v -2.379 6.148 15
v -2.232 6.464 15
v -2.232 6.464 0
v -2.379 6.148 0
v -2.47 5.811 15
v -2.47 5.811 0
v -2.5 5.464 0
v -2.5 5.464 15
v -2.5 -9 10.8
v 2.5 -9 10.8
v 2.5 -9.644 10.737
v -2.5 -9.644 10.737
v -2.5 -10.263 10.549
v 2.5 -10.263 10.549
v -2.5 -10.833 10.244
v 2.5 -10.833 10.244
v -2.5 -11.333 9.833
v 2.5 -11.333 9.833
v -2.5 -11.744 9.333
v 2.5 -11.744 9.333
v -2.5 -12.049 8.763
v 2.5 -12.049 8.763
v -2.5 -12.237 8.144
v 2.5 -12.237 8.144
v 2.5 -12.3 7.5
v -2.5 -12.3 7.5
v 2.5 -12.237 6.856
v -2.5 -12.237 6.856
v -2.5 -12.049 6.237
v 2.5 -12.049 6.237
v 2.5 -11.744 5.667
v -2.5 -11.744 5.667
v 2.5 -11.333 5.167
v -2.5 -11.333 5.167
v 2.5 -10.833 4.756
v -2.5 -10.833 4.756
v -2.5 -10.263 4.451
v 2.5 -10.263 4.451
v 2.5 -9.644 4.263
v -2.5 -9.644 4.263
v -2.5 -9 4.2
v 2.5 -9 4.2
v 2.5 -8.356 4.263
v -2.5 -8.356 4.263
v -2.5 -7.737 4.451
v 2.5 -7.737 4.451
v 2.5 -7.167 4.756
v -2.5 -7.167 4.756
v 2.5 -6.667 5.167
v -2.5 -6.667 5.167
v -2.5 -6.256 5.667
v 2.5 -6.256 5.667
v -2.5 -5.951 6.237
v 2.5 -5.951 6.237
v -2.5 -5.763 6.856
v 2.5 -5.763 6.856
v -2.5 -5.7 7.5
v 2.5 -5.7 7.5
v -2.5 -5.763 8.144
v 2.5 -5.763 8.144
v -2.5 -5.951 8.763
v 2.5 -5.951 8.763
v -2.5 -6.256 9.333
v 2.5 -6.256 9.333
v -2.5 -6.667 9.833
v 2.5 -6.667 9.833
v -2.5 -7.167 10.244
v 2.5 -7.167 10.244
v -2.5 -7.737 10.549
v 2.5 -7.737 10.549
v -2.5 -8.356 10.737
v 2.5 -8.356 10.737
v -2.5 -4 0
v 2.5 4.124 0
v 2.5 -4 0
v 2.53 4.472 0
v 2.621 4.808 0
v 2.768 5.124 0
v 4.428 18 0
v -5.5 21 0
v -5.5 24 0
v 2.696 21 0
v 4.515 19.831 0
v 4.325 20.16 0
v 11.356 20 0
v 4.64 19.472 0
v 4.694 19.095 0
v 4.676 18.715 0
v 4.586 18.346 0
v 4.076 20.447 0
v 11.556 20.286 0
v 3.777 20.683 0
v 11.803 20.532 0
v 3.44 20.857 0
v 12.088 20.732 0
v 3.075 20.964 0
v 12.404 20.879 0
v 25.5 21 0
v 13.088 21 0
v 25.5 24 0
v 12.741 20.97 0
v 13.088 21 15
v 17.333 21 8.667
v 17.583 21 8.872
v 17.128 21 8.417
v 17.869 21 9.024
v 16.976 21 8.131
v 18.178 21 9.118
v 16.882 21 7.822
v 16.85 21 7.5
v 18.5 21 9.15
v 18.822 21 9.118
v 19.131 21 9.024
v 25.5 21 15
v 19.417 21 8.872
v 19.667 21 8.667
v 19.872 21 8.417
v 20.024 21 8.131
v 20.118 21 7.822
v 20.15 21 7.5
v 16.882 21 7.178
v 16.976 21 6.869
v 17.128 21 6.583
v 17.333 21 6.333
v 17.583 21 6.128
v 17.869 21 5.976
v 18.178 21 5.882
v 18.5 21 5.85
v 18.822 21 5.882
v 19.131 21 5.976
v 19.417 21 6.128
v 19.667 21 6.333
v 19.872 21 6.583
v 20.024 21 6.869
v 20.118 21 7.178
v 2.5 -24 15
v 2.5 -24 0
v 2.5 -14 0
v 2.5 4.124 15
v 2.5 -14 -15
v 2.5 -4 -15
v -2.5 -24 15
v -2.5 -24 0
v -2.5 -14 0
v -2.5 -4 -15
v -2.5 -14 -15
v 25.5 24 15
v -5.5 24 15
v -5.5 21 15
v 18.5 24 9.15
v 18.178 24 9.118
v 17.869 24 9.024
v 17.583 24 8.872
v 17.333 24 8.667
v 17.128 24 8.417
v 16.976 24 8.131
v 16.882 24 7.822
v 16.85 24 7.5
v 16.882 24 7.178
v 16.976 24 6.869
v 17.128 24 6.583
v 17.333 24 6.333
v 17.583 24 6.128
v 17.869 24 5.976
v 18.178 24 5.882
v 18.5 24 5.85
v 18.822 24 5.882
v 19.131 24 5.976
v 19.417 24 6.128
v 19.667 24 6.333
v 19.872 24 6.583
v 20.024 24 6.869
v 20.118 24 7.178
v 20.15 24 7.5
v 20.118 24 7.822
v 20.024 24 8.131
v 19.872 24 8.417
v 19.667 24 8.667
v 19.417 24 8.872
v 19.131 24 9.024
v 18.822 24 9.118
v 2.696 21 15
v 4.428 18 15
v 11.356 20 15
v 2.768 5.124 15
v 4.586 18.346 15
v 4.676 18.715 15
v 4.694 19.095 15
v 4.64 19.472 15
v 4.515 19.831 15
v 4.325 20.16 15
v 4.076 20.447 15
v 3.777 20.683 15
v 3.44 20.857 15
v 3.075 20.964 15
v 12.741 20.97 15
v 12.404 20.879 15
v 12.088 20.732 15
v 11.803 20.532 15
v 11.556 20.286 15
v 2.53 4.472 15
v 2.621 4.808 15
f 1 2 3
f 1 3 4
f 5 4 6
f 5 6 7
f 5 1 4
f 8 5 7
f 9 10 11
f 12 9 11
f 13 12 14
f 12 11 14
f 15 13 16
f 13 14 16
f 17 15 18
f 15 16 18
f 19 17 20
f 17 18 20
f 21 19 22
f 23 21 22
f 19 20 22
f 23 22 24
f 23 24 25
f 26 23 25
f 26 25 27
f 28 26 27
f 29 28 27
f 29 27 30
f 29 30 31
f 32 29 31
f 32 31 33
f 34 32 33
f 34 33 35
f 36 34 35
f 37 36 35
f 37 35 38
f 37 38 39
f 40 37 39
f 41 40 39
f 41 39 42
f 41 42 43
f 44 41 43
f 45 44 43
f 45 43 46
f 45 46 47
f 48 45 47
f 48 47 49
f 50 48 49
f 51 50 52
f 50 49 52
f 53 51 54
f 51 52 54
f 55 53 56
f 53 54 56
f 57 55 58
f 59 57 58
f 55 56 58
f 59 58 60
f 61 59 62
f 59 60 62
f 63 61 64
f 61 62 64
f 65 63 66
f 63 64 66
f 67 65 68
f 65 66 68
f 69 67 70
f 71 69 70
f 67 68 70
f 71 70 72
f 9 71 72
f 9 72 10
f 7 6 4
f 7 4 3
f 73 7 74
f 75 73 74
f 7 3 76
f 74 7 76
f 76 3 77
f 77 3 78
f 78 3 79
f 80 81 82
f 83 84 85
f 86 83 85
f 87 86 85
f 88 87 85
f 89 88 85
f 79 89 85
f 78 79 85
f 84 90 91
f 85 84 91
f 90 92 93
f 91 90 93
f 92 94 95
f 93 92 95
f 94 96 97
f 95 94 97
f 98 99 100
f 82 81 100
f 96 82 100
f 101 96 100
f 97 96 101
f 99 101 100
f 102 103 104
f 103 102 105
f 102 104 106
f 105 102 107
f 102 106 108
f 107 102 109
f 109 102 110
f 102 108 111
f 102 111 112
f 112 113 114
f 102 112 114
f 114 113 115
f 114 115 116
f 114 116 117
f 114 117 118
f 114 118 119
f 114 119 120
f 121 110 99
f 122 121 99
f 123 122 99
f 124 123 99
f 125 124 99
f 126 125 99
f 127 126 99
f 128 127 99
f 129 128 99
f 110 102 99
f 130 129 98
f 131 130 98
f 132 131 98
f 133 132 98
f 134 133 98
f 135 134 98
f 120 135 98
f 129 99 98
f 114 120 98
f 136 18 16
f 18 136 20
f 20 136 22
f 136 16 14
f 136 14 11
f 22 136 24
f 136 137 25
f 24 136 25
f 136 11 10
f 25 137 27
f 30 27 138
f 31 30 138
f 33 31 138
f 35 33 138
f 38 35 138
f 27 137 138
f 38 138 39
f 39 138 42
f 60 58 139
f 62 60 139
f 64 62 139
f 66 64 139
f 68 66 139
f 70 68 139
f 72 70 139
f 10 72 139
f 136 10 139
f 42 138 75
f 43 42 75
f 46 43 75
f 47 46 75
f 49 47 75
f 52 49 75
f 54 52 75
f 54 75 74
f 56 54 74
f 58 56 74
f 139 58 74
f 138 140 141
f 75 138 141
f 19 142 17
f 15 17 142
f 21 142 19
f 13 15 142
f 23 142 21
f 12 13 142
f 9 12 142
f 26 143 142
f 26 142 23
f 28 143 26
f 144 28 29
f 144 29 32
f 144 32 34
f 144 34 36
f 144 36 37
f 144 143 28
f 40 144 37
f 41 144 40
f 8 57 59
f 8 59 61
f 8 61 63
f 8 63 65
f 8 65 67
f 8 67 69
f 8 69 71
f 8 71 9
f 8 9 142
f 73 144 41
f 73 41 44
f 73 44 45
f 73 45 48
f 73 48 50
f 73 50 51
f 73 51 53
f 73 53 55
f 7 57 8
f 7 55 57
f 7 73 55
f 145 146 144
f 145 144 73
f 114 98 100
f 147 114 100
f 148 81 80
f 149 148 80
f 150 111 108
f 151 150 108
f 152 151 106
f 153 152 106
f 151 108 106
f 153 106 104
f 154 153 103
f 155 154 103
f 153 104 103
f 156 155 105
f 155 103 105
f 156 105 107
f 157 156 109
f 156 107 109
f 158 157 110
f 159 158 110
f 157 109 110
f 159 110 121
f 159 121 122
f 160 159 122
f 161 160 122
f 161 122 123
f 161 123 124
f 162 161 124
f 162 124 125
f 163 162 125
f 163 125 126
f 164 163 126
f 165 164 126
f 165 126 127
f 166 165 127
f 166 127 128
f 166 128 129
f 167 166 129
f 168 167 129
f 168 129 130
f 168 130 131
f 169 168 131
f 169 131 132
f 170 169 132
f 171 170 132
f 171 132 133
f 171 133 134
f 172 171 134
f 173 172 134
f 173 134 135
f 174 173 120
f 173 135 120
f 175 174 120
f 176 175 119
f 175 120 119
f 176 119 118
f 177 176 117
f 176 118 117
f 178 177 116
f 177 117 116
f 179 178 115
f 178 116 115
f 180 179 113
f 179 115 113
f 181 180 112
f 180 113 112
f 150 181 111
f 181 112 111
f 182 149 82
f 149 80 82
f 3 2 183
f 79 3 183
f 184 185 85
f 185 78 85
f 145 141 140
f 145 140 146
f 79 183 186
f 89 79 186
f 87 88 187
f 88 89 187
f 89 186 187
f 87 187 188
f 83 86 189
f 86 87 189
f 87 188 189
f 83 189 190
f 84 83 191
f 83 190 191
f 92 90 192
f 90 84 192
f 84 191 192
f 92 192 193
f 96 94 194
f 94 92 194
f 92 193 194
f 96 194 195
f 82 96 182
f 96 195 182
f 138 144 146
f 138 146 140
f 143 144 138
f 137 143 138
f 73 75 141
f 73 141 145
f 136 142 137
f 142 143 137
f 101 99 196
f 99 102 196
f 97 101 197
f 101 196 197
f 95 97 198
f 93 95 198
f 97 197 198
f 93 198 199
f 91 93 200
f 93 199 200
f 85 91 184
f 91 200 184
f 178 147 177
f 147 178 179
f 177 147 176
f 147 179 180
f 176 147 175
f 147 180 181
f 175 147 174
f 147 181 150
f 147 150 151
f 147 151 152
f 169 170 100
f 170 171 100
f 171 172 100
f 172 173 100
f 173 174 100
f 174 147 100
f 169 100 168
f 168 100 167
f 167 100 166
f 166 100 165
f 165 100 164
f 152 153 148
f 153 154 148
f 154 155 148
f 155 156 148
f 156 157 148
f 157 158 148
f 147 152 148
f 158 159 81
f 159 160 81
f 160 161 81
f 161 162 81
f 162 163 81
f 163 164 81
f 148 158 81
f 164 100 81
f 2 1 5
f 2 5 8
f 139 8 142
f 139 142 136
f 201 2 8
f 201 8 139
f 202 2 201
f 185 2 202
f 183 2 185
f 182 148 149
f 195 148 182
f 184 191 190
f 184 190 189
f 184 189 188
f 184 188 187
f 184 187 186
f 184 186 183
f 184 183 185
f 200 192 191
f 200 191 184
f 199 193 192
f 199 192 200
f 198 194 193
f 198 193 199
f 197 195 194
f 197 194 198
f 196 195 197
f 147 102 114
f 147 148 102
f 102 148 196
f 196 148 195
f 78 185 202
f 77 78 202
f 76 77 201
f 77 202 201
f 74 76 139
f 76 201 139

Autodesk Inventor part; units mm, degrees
ref_plane "YZ Plane" through (0, 0, 0) normal (1, 0, 0) x (0, 1, 0)
ref_plane "XZ Plane" through (0, 0, 0) normal (0, 1, 0) x (-1, 0, 0)
ref_plane "XY Plane" through (0, 0, 0) normal (0, 0, 1) x (1, 0, 0)
sketch "Náčrt1" plane through (0, 0, 0) normal (0, 0, 1) x (1, 0, 0)
  line L0 (0, 33.6) -> (0, -33.6)
  line L1 (-11.7, 0) -> (31.7, 0)
  line L2 (-2.5, -24) -> (2.5, -24)
  line L3 (2.5, -24) -> (2.5, 4.6603)
  line L4 (2.5, 4.6603) -> (11.9338, 21)
  line L5 (11.9338, 21) -> (25.5, 21)
  line L6 (25.5, 21) -> (25.5, 24)
  line L7 (25.5, 24) -> (-5.5, 24)
  line L8 (-5.5, 24) -> (-5.5, 21)
  line L9 (-5.5, 21) -> (11.9338, 21)
  line L10 (-2.5, -24) -> (-2.5, 6)
  line L11 (-2.5, 6) -> (6.1603, 21)
  point P0 (0, 0)
  dimension "d0" = 5
  dimension "d2" = 5
  dimension "d3" = 30
  dimension "d4" = 15
  dimension "d5" = 31
  dimension "d6" = 3
  dimension "d7" = 60
  dimension "d8" = 3
extrude "Vysunutí1" add sketch "Náčrt1" along normal blind 15 contours L7 L6 L5 L9 L0 | L0 L9 L8 L7 | L11 L9 L4 L3 L1 L0 | L0 L1 L10 L11 | L1 L3 L2 L0 | L0 L2 L10 L1
sketch "Náčrt2" plane through (-2.5, -24, 0) normal (-1, 0, 0) x (0, 0, 1)
  line L0 (0, 30) -> (0, 0)
  line L1 (0, 0) -> (15, 0)
  line L2 (15, 30) -> (15, 0)
  line L3 (0, 30) -> (15, 30)
  line L4 (0, -9.6) -> (0, 57.6)
  line L5 (-3, 24) -> (18, 24)
  point P0 (0, 24)
  point P1 (7.5, 15)
  dimension "d11" = 15
  dimension "d12" = 7.5
hole "Díra1" at (-2.5, -9, 7.5) direction (1, 0, 0) diameter 6.6 end through all
sketch "Náčrt3" plane through (-5.5, 24, 0) normal (0, 1, 0) x (1, 0, 0)
  line L0 (31, 0) -> (0, 0)
  line L1 (0, 0) -> (0, -15)
  line L2 (31, -15) -> (0, -15)
  line L3 (31, 0) -> (31, -15)
  line L4 (5.5, 3) -> (5.5, -18)
  line L5 (37.2, 0) -> (-6.2, 0)
  point P0 (5.5, 0)
  point P1 (24, -7.5)
  point P2 (31, -7.5)
  dimension "d20" = 7.5
  dimension "d21" = 7
hole "Díra2" at (18.5, 24, 7.5) direction (0, -1, 0) diameter 3.3 end through all
fillet "Zaoblení1" radius 2 4 edges at (11.9338, 21, 7.5) (6.1603, 21, 7.5) (2.5, 4.6603, 7.5) (-2.5, 6, 7.5)
sketch "Náčrt4" plane through (0, 0, 0) normal (0, 0, -1) x (-1, 0, 0)
  arc A0 (2.5, 5.4641) -> (2.2321, 6.4641) centre (0.5, 5.4641) ccw
  line L0 (-4.4282, 18) -> (2.2321, 6.4641)
  arc A1 (-2.6962, 21) -> (-4.4282, 18) centre (-2.6962, 19) ccw
  line L1 (5.5, 21) -> (-2.6962, 21)
  line L2 (5.5, 24) -> (5.5, 21)
  line L3 (-25.5, 24) -> (5.5, 24)
  line L4 (-25.5, 21) -> (-25.5, 24)
  line L5 (-13.0885, 21) -> (-25.5, 21)
  arc A2 (-11.3564, 20) -> (-13.0885, 21) centre (-13.0885, 19) ccw
  line L6 (-2.7679, 5.1244) -> (-11.3564, 20)
  arc A3 (-2.5, 4.1244) -> (-2.7679, 5.1244) centre (-4.5, 4.1244) ccw
  line L7 (-2.5, -24) -> (-2.5, 4.1244)
  line L8 (2.5, -24) -> (-2.5, -24)
  line L9 (2.5, 5.4641) -> (2.5, -24)
  line L10 (2.5, -14) -> (-2.5, -14)
  line L11 (-2.5, -14) -> (-2.5, -4)
  line L12 (-2.5, -4) -> (2.5, -4)
  line L13 (2.5, -4) -> (2.5, -14)
  point P0 (0, 0)
  dimension "d30" = 10
  dimension "d31" = 10
extrude "Vysunutí2" add sketch "Náčrt4" along normal blind 15 contours L9 L10 L7 L12
properties part number "IR_senzor_hold_v2_3D tisk"
